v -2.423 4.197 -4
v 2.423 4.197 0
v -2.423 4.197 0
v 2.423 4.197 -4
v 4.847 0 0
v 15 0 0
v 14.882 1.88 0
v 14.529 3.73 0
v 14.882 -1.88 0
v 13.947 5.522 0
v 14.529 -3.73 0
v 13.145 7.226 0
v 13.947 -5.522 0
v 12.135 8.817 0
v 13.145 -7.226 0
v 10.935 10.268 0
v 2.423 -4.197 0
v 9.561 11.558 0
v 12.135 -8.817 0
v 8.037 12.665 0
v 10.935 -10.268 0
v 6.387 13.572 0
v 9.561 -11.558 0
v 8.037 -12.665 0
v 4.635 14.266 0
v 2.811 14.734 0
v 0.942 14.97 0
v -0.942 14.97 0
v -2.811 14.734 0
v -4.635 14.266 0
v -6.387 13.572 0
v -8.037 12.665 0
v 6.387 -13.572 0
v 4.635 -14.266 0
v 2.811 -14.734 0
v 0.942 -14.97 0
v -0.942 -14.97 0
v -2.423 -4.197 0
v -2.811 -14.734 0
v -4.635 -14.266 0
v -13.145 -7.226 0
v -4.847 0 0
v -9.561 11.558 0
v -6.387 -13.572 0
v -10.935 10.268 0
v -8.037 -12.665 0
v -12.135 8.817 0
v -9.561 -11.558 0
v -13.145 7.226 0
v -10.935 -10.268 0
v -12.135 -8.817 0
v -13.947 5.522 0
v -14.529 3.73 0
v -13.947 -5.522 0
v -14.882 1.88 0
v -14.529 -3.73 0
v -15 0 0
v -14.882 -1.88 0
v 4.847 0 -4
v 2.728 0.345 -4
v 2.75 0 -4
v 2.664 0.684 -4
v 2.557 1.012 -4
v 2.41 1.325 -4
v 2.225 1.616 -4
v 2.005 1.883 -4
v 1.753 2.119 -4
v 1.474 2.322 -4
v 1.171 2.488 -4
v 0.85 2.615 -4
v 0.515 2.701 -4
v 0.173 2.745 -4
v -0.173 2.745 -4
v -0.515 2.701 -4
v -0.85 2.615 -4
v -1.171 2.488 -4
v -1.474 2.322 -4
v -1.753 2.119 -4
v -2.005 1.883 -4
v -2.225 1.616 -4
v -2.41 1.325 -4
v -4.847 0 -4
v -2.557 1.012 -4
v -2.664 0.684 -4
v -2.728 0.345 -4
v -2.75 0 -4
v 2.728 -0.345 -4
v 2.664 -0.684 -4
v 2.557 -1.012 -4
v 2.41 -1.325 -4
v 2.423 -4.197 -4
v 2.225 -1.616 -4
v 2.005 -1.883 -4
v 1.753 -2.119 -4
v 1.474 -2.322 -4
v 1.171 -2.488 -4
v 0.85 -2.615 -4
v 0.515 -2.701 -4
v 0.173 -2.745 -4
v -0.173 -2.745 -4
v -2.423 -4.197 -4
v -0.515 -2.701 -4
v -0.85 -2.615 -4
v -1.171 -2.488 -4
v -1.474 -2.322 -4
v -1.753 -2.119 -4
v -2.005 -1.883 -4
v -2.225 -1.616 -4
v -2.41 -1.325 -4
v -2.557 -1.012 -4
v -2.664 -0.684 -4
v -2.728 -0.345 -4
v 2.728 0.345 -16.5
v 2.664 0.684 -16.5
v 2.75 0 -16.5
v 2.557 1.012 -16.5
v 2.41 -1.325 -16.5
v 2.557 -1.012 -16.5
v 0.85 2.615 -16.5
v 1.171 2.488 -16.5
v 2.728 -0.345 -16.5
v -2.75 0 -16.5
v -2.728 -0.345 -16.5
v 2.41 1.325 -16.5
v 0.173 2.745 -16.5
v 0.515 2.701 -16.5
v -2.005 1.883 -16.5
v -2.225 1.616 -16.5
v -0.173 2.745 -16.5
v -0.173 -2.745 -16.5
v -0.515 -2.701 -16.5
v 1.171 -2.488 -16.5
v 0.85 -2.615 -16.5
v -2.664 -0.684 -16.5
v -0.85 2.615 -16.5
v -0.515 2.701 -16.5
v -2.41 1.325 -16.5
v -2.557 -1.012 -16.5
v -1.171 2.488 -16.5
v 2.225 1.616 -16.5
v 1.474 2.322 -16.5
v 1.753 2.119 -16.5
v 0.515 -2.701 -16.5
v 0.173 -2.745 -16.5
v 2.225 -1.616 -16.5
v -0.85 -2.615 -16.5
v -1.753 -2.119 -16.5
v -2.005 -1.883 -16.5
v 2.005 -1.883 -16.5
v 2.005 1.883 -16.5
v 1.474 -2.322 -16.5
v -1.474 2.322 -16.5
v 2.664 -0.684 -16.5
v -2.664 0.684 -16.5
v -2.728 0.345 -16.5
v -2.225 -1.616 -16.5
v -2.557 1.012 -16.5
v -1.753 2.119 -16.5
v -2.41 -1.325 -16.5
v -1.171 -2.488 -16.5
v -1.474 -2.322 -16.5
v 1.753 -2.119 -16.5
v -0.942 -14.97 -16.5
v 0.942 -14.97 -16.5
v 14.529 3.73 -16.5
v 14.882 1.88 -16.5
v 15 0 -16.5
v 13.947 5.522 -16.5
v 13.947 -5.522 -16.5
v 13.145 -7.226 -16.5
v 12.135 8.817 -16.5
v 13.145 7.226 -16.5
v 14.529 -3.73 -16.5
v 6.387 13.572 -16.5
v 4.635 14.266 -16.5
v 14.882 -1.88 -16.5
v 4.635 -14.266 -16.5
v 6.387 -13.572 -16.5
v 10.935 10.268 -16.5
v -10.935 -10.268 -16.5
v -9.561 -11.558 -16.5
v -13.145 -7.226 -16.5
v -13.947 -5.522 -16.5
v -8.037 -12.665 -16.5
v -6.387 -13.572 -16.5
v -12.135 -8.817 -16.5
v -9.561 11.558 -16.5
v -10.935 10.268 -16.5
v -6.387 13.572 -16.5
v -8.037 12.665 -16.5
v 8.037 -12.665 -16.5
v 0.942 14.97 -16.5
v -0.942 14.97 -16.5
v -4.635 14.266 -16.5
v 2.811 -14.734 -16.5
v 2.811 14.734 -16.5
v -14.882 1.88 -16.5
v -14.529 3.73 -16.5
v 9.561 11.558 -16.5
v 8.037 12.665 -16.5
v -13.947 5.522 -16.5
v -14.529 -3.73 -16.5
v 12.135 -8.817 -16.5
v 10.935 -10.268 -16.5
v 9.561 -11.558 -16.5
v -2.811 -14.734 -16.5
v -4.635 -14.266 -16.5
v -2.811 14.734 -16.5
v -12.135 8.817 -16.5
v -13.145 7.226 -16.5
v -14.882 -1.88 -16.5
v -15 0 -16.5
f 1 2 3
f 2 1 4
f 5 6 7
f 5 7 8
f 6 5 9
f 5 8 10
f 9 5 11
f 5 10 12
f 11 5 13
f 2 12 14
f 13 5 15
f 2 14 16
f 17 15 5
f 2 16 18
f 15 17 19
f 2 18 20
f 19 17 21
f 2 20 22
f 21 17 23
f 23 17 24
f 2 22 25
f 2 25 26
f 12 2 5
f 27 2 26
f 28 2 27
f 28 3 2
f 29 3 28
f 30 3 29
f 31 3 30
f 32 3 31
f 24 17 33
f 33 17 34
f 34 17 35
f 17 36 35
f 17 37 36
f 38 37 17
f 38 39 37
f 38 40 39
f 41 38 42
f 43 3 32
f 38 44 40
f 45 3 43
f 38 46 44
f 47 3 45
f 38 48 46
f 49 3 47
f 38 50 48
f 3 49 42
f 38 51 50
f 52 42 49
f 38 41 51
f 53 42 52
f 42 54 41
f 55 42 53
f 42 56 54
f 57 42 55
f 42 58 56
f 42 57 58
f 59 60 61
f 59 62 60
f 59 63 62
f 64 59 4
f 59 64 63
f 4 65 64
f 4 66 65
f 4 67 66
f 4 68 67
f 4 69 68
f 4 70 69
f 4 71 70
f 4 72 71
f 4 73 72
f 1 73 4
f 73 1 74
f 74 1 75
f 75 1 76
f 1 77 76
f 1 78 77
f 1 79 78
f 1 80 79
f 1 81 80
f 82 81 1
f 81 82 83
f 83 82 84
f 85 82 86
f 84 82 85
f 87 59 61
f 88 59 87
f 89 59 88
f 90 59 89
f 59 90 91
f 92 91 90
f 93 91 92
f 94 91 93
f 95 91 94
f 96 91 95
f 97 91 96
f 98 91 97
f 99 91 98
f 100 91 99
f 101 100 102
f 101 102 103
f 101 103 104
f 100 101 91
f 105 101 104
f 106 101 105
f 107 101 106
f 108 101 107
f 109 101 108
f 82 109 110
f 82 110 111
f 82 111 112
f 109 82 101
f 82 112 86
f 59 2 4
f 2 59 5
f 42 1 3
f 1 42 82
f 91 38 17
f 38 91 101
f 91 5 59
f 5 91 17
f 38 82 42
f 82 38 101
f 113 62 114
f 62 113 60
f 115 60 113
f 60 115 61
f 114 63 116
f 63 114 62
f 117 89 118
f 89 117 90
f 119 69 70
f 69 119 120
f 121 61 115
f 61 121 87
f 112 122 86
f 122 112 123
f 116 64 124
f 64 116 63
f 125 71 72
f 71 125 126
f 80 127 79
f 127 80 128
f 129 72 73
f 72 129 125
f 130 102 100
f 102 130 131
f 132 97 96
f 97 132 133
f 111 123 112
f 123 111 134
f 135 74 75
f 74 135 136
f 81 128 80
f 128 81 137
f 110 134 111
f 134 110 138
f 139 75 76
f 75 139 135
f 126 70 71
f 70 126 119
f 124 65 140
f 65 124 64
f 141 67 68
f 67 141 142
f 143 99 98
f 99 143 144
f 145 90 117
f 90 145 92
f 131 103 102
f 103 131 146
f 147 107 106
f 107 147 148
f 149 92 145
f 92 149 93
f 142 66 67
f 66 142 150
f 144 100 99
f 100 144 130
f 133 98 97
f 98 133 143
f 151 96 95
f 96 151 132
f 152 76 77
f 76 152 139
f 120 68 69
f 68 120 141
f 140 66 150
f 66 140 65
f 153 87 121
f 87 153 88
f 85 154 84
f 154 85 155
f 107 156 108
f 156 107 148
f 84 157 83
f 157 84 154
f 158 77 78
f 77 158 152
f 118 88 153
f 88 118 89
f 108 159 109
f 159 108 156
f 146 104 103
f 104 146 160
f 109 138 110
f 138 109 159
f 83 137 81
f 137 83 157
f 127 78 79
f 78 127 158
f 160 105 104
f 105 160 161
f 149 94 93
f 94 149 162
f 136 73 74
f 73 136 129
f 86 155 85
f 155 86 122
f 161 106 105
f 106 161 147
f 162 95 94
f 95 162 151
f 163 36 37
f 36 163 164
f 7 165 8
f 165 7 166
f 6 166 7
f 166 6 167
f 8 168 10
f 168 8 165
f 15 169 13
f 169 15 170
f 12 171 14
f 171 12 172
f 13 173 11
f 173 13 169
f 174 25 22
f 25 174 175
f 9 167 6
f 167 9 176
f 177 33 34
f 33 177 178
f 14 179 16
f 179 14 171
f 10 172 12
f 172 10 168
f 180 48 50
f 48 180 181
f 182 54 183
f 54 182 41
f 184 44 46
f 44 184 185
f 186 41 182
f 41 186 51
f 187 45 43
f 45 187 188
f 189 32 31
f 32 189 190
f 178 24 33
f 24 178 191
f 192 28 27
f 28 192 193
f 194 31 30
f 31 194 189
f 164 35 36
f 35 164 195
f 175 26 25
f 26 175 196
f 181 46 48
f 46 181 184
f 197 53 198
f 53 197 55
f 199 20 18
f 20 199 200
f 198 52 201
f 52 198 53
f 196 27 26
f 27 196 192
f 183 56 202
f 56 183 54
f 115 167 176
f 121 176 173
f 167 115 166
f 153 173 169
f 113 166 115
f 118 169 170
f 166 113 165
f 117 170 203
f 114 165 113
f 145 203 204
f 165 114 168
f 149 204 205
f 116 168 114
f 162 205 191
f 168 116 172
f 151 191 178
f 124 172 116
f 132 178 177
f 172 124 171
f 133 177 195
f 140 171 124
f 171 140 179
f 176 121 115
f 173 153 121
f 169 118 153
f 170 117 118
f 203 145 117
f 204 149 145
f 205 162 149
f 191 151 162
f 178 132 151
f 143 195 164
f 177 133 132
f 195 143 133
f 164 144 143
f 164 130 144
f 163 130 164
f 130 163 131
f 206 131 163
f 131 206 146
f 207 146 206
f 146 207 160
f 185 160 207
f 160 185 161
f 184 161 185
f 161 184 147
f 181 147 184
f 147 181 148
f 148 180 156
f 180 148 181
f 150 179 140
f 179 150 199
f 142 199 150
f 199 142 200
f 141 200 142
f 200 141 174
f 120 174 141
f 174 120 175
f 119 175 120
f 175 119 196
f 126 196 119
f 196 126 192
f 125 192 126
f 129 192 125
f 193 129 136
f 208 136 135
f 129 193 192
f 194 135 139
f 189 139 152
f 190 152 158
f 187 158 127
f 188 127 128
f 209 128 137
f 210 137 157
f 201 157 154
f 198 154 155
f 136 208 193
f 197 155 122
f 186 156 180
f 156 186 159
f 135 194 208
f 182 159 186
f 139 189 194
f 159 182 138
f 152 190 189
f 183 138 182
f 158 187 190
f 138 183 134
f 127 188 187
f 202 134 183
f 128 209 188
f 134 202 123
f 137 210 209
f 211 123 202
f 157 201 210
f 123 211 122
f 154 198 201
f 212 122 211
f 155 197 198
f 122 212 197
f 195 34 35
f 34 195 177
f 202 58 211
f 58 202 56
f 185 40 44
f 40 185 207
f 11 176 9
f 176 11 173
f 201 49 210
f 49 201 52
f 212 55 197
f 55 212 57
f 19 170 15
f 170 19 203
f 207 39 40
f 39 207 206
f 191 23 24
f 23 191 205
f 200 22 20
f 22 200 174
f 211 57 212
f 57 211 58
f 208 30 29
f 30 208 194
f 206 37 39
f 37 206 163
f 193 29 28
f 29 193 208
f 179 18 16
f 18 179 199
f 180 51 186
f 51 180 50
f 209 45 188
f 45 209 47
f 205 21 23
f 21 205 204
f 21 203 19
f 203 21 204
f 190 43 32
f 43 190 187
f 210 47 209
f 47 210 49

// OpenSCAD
$fn = 50;

difference() {
	union() {
		translate(v = [0, 0, -16.5]) {
			cylinder(h = 16.5, r = 15.0);
		}
	}
	union() {
		translate(v = [0, 0, 0]) {
			rotate(a = [0, 0, 0]) {
				difference() {
					union() {
						translate(v = [0, 0, -4]) {
							linear_extrude(height = 4) {
								polygon(points = [[4.8468, 0.0], [2.4234000000000004, 4.197451927062417], [-2.423399999999999, 4.197451927062417], [-4.8468, 5.935618106107392e-16], [-2.423400000000002, -4.197451927062416], [2.423399999999997, -4.197451927062419]]);
							}
						}
					}
					union();
				}
			}
		}
		#translate(v = [0, 0, -100.0]) {
			cylinder(h = 200, r = 2.75);
		}
	}
}
